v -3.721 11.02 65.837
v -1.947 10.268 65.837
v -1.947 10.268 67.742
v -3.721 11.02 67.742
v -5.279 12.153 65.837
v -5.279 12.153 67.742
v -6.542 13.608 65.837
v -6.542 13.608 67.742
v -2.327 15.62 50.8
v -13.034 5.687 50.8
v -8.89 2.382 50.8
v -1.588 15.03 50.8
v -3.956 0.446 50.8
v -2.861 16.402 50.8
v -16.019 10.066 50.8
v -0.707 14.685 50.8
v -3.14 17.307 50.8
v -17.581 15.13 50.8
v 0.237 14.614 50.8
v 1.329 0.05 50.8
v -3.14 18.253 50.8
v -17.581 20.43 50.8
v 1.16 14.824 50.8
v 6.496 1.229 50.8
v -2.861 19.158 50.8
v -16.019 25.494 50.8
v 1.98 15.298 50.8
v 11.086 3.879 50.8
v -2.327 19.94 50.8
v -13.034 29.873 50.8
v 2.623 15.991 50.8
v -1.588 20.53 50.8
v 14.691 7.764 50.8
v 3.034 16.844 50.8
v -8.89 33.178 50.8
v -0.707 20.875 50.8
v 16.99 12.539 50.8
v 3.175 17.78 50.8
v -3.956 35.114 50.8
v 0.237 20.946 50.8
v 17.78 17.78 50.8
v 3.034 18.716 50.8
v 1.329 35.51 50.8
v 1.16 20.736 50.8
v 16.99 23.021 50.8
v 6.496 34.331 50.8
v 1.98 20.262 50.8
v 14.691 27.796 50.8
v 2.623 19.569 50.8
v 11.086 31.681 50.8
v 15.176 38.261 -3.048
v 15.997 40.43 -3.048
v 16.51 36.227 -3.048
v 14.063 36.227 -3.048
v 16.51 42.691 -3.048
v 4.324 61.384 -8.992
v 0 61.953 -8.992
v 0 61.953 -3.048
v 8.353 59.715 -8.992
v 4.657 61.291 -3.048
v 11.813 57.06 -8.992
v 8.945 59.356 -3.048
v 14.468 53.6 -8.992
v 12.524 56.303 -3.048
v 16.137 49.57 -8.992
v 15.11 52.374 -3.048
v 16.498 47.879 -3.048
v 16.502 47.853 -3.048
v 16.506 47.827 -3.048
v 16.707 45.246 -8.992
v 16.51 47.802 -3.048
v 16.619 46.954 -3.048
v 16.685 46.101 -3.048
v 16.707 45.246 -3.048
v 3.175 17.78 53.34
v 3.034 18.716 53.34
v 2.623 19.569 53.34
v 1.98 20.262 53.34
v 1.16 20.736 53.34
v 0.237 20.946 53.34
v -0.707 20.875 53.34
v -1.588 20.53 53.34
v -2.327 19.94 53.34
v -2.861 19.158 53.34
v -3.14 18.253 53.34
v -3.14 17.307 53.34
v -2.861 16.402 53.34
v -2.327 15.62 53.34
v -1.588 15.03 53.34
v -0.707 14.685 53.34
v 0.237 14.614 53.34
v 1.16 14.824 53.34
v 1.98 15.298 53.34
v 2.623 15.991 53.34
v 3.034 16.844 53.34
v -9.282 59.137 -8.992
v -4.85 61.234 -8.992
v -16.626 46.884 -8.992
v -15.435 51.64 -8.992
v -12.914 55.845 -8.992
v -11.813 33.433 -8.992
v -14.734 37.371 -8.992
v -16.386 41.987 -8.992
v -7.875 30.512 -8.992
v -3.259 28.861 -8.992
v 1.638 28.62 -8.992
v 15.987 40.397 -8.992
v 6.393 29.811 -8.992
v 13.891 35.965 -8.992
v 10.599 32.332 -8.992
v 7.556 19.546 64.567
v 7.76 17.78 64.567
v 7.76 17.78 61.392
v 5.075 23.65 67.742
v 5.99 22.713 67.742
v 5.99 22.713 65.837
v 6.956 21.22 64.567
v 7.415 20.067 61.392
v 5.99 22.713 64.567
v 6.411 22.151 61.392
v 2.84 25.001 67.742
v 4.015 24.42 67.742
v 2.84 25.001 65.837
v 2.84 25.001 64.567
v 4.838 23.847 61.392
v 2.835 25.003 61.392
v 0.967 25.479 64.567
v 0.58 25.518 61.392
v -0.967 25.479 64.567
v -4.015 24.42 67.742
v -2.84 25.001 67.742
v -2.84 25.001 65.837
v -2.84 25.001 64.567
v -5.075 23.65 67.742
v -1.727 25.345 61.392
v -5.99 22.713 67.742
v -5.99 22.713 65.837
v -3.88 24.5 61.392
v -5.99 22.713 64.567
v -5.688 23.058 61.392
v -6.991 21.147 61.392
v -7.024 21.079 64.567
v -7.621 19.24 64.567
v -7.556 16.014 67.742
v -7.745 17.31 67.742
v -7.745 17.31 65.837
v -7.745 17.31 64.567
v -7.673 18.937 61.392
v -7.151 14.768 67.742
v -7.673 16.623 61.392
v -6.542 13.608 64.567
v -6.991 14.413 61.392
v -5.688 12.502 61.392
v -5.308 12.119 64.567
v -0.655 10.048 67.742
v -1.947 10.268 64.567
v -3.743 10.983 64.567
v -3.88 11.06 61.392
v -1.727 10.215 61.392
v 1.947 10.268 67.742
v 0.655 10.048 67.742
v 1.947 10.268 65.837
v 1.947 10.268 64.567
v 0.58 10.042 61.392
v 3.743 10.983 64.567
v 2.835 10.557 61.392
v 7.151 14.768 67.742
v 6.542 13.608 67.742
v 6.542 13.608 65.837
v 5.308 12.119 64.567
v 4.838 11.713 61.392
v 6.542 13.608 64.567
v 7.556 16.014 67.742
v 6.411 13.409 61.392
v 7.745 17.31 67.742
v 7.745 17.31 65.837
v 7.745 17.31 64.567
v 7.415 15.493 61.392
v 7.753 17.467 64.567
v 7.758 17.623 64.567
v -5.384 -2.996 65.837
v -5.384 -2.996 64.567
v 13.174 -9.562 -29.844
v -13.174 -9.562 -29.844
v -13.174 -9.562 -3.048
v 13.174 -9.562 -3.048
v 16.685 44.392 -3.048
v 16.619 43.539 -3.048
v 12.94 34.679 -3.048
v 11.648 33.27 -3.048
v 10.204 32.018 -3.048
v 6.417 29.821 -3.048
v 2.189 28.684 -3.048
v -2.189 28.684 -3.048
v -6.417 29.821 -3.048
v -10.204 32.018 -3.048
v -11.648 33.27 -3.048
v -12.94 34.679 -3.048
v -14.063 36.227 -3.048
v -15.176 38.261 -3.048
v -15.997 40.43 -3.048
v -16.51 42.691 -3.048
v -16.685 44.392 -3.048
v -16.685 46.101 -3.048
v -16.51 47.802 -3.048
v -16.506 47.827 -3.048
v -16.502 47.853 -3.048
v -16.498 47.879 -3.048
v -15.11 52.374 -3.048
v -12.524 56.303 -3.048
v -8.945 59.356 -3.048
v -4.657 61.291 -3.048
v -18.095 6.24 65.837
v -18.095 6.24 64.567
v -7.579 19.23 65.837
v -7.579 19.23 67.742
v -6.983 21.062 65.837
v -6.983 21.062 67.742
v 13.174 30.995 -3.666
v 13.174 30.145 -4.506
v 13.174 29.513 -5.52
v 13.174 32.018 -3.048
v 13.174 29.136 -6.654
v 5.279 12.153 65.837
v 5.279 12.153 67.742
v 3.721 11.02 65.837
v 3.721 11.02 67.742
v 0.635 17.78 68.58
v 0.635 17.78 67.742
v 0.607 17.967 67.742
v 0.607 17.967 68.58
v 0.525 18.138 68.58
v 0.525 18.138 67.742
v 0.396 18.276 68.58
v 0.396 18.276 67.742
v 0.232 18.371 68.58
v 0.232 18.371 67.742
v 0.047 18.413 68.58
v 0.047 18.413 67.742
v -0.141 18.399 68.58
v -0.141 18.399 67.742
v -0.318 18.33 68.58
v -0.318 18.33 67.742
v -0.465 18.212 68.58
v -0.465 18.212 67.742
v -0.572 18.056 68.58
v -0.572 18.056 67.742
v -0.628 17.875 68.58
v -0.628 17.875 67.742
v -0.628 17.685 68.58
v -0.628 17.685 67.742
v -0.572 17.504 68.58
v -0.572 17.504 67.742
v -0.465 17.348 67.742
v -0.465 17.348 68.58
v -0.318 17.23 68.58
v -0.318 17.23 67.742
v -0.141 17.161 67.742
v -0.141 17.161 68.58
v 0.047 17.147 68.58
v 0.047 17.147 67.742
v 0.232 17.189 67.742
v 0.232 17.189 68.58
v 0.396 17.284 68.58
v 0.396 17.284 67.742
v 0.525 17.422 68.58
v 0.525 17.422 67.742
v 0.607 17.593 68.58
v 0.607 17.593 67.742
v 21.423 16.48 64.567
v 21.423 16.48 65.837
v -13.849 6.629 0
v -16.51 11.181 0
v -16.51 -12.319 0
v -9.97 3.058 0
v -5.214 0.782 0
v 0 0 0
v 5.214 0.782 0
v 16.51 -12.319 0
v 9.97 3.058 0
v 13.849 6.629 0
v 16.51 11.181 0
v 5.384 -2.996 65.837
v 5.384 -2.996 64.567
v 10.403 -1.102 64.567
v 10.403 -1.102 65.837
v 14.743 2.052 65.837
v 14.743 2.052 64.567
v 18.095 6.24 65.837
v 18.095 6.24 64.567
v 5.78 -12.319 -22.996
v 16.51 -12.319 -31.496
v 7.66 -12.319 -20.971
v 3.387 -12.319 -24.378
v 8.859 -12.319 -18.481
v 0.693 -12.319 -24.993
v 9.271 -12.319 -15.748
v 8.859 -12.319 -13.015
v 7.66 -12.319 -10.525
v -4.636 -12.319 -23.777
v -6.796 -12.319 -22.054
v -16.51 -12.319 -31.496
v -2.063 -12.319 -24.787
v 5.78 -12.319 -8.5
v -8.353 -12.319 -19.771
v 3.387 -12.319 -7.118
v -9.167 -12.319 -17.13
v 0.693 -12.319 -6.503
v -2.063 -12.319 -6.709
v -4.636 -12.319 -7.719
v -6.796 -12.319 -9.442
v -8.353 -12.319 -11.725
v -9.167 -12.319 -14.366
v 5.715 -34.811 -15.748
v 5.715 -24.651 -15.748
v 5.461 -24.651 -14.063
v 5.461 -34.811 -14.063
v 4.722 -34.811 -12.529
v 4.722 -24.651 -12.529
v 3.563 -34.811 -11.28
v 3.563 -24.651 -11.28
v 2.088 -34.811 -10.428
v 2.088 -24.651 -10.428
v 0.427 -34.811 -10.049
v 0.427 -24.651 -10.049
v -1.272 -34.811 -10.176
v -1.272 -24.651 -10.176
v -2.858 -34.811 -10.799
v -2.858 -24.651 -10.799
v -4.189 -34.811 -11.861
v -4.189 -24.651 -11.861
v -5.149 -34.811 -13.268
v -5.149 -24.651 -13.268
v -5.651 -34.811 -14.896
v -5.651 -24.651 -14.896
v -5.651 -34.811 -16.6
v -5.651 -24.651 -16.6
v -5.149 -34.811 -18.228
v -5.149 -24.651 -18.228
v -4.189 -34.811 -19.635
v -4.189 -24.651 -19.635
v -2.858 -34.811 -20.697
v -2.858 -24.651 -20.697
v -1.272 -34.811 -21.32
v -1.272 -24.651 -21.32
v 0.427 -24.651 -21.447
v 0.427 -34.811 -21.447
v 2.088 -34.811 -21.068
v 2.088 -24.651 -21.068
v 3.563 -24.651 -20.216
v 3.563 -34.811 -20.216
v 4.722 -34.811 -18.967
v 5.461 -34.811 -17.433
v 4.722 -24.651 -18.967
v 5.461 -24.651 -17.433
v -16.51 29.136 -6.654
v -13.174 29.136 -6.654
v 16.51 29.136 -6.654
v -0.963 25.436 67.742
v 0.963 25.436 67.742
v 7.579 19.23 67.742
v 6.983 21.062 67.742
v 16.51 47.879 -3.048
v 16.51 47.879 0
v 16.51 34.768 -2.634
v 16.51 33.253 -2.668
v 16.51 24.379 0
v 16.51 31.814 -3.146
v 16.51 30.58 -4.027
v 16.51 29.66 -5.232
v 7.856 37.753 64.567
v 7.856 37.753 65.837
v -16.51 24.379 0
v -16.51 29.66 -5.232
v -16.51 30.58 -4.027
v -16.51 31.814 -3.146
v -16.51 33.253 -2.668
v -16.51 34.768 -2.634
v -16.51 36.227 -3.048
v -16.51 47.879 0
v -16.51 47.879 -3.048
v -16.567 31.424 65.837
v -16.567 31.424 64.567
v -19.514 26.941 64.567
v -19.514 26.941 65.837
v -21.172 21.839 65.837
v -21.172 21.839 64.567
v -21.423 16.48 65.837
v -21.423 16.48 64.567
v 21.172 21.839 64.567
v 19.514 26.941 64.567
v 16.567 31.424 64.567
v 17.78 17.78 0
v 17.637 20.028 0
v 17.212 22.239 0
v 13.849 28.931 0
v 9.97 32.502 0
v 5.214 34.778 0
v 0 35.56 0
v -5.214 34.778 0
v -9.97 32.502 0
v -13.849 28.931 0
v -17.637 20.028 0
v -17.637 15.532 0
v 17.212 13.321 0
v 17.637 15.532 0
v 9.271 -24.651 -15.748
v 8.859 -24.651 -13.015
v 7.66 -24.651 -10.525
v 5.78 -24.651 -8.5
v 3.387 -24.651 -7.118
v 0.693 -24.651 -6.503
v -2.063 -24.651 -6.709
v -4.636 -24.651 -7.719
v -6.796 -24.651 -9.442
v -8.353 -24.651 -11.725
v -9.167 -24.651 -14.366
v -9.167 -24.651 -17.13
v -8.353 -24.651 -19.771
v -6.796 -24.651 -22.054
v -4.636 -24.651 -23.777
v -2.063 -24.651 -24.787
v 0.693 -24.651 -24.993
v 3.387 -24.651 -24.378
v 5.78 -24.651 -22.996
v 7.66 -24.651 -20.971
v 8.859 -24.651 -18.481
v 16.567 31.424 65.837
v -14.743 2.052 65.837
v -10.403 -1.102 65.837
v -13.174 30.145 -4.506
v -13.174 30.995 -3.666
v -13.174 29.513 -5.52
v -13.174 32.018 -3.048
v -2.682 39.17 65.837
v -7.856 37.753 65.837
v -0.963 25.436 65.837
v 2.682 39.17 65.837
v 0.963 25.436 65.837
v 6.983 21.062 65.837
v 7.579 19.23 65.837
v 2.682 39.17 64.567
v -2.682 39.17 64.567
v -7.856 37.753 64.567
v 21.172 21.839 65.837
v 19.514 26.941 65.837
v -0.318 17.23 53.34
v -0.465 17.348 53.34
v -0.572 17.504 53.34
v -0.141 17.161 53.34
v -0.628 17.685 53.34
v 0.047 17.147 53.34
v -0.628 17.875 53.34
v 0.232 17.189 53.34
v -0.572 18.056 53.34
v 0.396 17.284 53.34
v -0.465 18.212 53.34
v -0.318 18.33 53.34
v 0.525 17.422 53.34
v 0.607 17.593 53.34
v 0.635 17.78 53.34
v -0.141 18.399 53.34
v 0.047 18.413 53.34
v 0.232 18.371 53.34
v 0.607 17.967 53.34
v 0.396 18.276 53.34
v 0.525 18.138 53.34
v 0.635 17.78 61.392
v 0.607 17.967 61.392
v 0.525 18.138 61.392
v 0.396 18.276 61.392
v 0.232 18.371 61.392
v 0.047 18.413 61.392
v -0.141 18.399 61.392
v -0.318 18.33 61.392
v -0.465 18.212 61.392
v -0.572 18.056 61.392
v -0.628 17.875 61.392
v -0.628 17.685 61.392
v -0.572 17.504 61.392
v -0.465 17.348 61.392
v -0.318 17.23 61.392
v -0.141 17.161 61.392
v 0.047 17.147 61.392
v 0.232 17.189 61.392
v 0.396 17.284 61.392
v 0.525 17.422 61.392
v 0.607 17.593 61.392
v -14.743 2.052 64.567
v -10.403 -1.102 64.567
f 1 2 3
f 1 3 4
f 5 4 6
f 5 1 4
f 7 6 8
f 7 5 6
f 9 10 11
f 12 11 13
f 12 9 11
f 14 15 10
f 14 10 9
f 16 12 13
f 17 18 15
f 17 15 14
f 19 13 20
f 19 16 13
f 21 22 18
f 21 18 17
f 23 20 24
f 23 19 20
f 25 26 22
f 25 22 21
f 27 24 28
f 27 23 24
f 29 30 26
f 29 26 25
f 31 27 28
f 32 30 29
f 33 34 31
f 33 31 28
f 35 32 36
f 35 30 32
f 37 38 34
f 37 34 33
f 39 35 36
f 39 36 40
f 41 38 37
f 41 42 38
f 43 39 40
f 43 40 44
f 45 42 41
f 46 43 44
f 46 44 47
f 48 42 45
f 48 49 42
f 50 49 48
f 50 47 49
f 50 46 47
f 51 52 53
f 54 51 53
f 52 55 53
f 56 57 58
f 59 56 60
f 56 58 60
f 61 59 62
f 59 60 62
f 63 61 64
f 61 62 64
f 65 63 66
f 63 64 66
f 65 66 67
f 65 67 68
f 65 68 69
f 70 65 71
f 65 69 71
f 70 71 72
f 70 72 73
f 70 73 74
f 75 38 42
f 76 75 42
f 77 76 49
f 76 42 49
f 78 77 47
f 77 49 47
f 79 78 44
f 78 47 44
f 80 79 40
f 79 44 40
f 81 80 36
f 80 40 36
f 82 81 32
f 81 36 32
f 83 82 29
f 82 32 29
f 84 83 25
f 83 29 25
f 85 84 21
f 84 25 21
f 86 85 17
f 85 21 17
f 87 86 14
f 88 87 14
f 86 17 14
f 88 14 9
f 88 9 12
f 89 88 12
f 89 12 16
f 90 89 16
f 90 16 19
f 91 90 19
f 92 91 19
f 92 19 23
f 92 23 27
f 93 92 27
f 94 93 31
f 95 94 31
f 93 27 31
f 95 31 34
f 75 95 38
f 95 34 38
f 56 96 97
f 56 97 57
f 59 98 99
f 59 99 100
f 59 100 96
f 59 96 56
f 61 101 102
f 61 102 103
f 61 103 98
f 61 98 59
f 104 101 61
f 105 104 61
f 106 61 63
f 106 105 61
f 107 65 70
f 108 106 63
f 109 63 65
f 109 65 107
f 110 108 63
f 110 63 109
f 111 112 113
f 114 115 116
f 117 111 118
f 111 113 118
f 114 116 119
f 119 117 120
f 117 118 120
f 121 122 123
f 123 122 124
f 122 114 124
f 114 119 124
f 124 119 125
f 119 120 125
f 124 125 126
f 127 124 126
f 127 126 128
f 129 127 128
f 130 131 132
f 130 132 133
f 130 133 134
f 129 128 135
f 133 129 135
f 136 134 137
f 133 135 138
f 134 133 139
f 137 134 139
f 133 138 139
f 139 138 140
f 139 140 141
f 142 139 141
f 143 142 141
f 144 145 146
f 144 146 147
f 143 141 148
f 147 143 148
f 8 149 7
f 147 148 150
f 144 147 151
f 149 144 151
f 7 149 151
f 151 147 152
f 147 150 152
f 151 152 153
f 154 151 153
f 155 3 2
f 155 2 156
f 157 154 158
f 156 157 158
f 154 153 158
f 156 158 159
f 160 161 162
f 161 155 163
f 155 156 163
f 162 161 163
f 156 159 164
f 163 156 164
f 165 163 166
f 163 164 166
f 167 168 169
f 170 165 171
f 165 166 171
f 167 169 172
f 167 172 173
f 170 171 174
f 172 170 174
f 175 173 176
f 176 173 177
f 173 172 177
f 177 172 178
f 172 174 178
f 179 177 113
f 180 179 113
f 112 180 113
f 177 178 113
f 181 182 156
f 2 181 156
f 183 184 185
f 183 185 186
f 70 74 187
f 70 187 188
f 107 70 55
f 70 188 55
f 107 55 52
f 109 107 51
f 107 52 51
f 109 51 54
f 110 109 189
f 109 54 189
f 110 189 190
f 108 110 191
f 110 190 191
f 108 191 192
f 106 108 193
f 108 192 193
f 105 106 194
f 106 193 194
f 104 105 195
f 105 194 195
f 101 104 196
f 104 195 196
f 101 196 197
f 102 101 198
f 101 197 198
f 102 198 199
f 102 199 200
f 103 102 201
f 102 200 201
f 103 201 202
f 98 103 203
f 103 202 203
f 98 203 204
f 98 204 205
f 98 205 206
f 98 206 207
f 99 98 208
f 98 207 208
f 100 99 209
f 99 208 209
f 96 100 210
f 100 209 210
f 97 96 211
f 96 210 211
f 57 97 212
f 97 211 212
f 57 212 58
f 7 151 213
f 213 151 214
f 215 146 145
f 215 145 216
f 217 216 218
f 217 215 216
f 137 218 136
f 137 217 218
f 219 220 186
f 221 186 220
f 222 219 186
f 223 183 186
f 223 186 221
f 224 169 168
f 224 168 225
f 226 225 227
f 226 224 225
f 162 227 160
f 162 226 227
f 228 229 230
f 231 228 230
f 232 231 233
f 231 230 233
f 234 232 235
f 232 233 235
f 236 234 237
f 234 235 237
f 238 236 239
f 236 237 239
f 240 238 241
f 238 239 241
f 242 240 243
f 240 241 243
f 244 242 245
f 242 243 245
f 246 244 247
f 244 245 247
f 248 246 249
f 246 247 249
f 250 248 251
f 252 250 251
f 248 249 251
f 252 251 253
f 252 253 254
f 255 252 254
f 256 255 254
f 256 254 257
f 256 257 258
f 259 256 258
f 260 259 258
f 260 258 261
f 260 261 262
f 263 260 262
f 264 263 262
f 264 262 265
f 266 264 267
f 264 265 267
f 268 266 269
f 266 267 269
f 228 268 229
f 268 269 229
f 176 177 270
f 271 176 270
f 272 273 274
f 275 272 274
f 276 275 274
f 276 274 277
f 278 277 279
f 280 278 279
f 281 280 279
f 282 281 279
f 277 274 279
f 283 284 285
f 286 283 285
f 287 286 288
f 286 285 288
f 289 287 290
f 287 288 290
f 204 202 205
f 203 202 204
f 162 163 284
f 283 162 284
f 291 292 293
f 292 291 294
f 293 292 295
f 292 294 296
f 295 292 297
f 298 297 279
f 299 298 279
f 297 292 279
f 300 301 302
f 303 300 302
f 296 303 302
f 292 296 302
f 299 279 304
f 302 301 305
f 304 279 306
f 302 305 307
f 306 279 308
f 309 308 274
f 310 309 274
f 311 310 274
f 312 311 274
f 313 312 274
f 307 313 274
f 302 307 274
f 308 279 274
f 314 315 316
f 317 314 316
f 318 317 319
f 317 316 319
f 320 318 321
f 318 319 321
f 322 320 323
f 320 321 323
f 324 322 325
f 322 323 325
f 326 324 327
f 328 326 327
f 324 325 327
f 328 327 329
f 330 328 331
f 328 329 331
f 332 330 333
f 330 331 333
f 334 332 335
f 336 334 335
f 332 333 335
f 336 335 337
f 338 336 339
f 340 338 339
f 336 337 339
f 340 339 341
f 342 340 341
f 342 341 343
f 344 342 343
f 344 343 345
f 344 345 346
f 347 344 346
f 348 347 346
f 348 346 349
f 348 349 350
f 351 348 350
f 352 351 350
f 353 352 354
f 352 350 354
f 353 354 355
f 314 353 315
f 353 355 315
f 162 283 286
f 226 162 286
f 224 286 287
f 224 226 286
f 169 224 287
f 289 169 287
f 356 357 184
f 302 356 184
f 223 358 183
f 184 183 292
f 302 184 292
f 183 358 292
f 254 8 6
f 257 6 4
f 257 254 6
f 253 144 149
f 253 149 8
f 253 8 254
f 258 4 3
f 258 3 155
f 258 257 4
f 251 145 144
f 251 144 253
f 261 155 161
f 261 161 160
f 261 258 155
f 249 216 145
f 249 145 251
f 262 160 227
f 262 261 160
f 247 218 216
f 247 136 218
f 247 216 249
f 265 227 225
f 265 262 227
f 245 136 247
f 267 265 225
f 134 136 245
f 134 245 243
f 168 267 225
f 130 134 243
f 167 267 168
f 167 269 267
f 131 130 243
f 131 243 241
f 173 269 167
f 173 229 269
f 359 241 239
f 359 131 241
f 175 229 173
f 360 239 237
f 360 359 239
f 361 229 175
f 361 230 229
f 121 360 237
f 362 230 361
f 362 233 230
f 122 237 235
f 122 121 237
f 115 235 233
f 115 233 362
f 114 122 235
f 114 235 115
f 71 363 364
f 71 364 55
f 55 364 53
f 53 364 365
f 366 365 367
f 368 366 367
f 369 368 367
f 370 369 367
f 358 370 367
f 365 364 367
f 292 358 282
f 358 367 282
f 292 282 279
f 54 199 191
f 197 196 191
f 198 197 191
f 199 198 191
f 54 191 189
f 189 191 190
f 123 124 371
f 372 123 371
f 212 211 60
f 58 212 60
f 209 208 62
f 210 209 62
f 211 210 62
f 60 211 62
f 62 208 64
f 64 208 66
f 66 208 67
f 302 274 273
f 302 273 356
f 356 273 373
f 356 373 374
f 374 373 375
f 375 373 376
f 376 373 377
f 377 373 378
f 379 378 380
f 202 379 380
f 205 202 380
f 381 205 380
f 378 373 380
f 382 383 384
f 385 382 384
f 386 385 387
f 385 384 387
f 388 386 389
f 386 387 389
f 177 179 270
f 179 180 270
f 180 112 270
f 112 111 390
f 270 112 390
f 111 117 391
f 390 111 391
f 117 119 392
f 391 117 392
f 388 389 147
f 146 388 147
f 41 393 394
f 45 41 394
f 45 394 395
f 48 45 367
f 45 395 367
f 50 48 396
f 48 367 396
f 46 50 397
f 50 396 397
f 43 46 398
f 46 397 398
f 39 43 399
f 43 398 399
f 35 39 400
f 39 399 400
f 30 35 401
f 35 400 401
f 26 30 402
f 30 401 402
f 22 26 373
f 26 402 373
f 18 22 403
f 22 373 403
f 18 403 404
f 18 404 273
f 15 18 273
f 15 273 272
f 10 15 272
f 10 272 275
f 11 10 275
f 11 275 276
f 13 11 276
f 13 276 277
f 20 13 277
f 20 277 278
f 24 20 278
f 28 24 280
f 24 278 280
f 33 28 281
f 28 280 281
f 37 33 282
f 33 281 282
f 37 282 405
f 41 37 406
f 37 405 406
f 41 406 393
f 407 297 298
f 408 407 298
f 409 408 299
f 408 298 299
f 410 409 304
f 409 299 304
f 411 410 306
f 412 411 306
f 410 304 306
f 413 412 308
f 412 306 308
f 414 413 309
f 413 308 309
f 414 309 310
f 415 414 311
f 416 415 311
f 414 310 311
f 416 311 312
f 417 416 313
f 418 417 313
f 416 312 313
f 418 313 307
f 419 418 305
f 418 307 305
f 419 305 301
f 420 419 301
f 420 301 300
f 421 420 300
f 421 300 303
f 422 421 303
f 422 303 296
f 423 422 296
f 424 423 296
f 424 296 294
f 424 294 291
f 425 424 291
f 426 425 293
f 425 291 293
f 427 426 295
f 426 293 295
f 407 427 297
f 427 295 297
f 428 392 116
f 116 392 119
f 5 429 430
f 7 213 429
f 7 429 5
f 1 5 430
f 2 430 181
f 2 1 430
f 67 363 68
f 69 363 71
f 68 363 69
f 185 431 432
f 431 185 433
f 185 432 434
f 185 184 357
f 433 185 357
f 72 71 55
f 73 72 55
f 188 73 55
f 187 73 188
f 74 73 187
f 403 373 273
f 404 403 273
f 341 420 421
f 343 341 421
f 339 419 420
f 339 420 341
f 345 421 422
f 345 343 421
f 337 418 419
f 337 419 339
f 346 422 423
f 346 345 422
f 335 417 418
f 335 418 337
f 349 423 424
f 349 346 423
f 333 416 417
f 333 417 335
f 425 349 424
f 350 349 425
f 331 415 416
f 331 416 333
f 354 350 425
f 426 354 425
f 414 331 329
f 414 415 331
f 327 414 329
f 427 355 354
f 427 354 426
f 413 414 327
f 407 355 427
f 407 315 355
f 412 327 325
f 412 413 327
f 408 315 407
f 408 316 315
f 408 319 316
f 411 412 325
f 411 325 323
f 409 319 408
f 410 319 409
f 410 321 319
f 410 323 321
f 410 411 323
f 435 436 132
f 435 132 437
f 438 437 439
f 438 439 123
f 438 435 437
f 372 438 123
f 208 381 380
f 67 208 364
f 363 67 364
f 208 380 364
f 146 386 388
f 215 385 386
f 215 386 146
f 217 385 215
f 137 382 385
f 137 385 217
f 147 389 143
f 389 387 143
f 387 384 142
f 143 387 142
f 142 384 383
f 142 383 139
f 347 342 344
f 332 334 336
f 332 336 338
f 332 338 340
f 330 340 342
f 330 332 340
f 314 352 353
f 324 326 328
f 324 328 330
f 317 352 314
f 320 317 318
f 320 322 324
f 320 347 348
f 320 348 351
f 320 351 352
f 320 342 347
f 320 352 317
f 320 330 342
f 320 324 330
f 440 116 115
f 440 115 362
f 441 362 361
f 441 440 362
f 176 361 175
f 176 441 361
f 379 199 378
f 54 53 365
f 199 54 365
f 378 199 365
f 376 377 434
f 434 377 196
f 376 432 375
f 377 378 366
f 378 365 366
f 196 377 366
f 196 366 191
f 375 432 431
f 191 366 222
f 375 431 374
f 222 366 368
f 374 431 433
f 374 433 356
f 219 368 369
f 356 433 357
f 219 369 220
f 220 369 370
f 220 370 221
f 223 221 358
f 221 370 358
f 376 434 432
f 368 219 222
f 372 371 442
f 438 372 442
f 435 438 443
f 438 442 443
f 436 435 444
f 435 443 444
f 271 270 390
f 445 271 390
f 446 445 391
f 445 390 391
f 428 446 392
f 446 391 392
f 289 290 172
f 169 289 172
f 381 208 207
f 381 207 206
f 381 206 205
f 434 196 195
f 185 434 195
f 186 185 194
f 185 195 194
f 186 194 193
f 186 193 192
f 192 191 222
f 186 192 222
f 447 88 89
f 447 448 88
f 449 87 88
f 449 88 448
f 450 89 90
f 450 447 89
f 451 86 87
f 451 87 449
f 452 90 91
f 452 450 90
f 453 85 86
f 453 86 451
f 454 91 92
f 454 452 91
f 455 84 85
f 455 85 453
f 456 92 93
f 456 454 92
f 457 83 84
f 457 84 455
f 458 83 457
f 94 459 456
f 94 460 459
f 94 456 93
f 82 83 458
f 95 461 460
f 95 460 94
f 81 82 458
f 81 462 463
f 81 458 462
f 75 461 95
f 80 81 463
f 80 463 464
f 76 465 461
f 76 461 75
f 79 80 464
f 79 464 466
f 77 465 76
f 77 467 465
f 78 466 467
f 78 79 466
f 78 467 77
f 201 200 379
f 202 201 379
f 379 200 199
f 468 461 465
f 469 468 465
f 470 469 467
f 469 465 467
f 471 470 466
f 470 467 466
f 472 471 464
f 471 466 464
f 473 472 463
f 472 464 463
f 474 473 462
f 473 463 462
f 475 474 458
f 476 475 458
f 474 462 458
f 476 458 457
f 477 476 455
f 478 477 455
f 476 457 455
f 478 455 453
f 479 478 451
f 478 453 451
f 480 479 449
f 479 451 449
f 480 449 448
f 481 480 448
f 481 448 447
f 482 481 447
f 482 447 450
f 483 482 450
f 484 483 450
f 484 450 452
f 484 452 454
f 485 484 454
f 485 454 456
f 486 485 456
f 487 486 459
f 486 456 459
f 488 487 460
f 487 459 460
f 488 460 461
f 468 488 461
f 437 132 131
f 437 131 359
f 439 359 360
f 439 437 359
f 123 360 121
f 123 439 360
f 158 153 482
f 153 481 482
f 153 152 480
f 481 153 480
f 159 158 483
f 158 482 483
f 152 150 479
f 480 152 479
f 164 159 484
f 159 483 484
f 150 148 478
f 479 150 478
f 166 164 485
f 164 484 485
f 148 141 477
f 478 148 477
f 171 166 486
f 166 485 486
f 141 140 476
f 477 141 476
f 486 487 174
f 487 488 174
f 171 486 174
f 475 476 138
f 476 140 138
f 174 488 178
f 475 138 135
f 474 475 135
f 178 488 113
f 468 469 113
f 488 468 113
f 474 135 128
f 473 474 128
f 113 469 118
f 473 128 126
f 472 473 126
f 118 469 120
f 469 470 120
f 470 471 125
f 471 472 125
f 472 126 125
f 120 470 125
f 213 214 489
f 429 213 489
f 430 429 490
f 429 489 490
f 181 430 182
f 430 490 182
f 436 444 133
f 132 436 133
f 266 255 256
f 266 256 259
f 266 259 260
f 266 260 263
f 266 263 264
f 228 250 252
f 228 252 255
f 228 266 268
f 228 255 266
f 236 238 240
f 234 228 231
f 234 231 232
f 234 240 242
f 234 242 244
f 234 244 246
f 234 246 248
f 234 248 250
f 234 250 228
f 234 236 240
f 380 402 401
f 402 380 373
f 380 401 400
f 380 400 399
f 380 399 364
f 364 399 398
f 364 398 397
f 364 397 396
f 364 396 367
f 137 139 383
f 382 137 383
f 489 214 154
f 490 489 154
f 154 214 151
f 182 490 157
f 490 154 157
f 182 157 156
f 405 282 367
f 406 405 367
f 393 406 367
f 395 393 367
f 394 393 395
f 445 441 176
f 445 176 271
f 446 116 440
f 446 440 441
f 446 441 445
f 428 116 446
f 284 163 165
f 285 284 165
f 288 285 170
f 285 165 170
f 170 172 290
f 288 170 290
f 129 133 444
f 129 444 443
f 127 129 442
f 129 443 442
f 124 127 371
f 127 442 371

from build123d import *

# Parameters (mm, degrees)
F1_DEPTH  = 50.8
F2_R      = 3.175
F3_DEPTH  = 2.54
F4_R      = 0.635
F5_DEPTH  = 8.0518
F6_R      = 7.7597
F7_DEPTH  = 3.175
F9_DEPTH  = 1.27
F10_DEPTH = 3.175
F11_R     = 0.635
F12_DEPTH = 0.8382
F14_DEPTH = 31.496
F16_DEPTH = 51.816
F18_W     = 26.3473056257
F18_H     = 54.6325752512
F19_DEPTH = 28.448
F21_DEPTH = 5.9436
F22_R     = 9.271
F23_DEPTH = 12.3317
F26_R     = 5.715
F27_DEPTH = 10.16


# Not quite as in the source:
# - a length typed as a fraction of an inch, garbled in the dataset ("3 / 203.2 mm" for 3/8 in), is restored


with BuildPart() as f1:
    # F0 (on Top) → F1 (new body)
    with BuildSketch(Plane.XY):
        with BuildLine():
            Line((0, 35.56), (0, 0))
            ThreePointArc((0, 0), (12.5723585695, 5.2076414305), (17.78, 17.78))
            ThreePointArc((17.78, 17.78), (12.5723585695, 30.3523585695), (0, 35.56))
        make_face()
        with BuildLine():
            ThreePointArc((0, 35.56), (-17.78, 17.78), (0, 0))
            Line((0, 0), (0, 35.56))
        make_face()
    extrude(amount=F1_DEPTH)

    # F2 (on face) → F3 (join)
    with BuildSketch(Plane.XY.offset(50.8)):
        with Locations((0, 17.78)):
            Circle(F2_R)
    extrude(amount=F3_DEPTH)

    # F4 (on face) → F5 (join)
    with BuildSketch(Plane.XY.offset(53.34)):
        with Locations((0, 17.78)):
            Circle(F4_R)
    extrude(amount=F5_DEPTH)

    # F6 (on face) → F7 (join)
    with BuildSketch(Plane.XY.offset(61.3918)):
        with Locations((0, 17.78)):
            Circle(F6_R)
    extrude(amount=F7_DEPTH)

    # F8 (on face) → F9 (join)
    with BuildSketch(Plane.XY.offset(64.5668)):
        with BuildLine():
            Line((-7.8562656417, 37.7526283264), (-2.8404457135, 25.0011364922))
            ThreePointArc((-2.8404457135, 25.0011364922), (0, 25.4905939517), (2.8404457135, 25.0011364922))
            Line((2.8404457135, 25.0011364922), (7.8562656417, 37.7526283264))
            ThreePointArc((7.8562656417, 37.7526283264), (0, 39.3496460261), (-7.8562656417, 37.7526283264))
        make_face()
        with BuildLine():
            ThreePointArc((-7.745454913, 17.3100294897), (-7.3332106223, 20.1627045678), (-5.9899629188, 22.7128782998))
            Line((-5.9899629188, 22.7128782998), (-16.5673787218, 31.4236342075))
            ThreePointArc((-16.5673787218, 31.4236342075), (-20.5139524073, 24.4453871847), (-21.422817913, 16.4801289429))
            Line((-21.422817913, 16.4801289429), (-7.745454913, 17.3100294897))
        make_face()
        with BuildLine():
            ThreePointArc((-1.946508681, 10.2684057588), (-4.5321734112, 11.5419984564), (-6.5424463887, 13.6075499595))
            Line((-6.5424463887, 13.6075499595), (-18.0954687963, 6.2396013439))
            ThreePointArc((-18.0954687963, 6.2396013439), (-12.6783198313, 0.3297898022), (-5.3837639633, -2.9959928207))
            Line((-5.3837639633, -2.9959928207), (-1.946508681, 10.2684057588))
        make_face()
        with BuildLine():
            ThreePointArc((6.5424463887, 13.6075499595), (4.5321734112, 11.5419984564), (1.946508681, 10.2684057588))
            Line((1.946508681, 10.2684057588), (5.3837639633, -2.9959928207))
            ThreePointArc((5.3837639633, -2.9959928207), (12.6783198313, 0.3297898022), (18.0954687963, 6.2396013439))
            Line((18.0954687963, 6.2396013439), (6.5424463887, 13.6075499595))
        make_face()
        with BuildLine():
            ThreePointArc((5.9899629188, 22.7128782998), (7.3332106223, 20.1627045678), (7.745454913, 17.3100294897))
            Line((7.745454913, 17.3100294897), (21.422817913, 16.4801289429))
            ThreePointArc((21.422817913, 16.4801289429), (20.5139524073, 24.4453871847), (16.5673787218, 31.4236342075))
            Line((16.5673787218, 31.4236342075), (5.9899629188, 22.7128782998))
        make_face()
    extrude(amount=F9_DEPTH)

    # F10 (add): a face of the model
    f10_faces = [f1.faces().sort_by_distance(p)[0] for p in [
        (0, 17.78, 64.5668),
    ]]
    extrude(f10_faces, amount=F10_DEPTH)

    # F11 (on face) → F12 (join)
    with BuildSketch(Plane.XY.offset(67.7418)):
        with Locations((0, 17.78)):
            Circle(F11_R)
    extrude(amount=F12_DEPTH)

    # F13 (on face) → F14 (join)
    with BuildSketch(Plane(origin=(0, 0, 0), x_dir=(1, 0, 0), z_dir=(0, 0, -1))):
        with BuildLine():
            Line((-16.51, 12.319), (-16.51, -11.1808864232))
            ThreePointArc((-16.51, -11.1808864232), (0, 0), (16.51, -11.1808864232))
            Line((16.51, -11.1808864232), (16.51, 12.319))
            Line((16.51, 12.319), (-16.51, 12.319))
        make_face()
        with BuildLine():
            ThreePointArc((16.51, -24.3791135768), (0, -35.56), (-16.51, -24.3791135768))
            Line((-16.51, -24.3791135768), (-16.51, -47.879))
            Line((-16.51, -47.879), (16.51, -47.879))
            Line((16.51, -47.879), (16.51, -24.3791135768))
        make_face()
        with BuildLine():
            Line((-16.51, -11.1808864232), (-16.51, -17.78))
            Line((-16.51, -17.78), (-16.51, -24.3791135768))
            ThreePointArc((-16.51, -24.3791135768), (0, -35.56), (16.51, -24.3791135768))
            Line((16.51, -24.3791135768), (16.51, -17.78))
            Line((16.51, -17.78), (16.51, -11.1808864232))
            ThreePointArc((16.51, -11.1808864232), (0, 0), (-16.51, -11.1808864232))
        make_face()
    extrude(amount=F14_DEPTH)

    # F15 (on face) → F16 (cut)
    with BuildSketch(Plane.YZ.offset(16.51)):
        with BuildLine():
            Line((29.1356388479, -6.6541871056), (-12.319, -31.496))
            Line((-12.319, -31.496), (47.879, -31.496))
            Line((47.879, -31.496), (47.879, -3.048))
            Line((47.879, -3.048), (36.2268202007, -3.048))
            ThreePointArc((36.2268202007, -3.048), (31.8141050009, -3.1459858946), (29.1356388479, -6.6541871056))
        make_face()
    extrude(amount=-F16_DEPTH, mode=Mode.SUBTRACT)

    # F18 (on offset) → F19 (cut)
    with BuildSketch(Plane.XY.offset(-31.496)):
        with Locations((0, 17.7540327422)):
            Rectangle(F18_W, F18_H)
    extrude(amount=F19_DEPTH, mode=Mode.SUBTRACT)

    # F20 (on face) → F21 (join)
    with BuildSketch(Plane(origin=(0, 0, -3.048), x_dir=(1, 0, 0), z_dir=(0, 0, -1))):
        with BuildLine():
            ThreePointArc((0, -61.9528820528), (11.813335281, -57.0596383625), (16.7065789713, -45.2463030815))
            ThreePointArc((16.7065789713, -45.2463030815), (-11.813335281, -33.4329678005), (0, -61.9528820528))
        make_face()
    extrude(amount=F21_DEPTH)

    # F22 (on face) → F23 (join)
    with BuildSketch(Plane.XZ.offset(12.319)):
        with Locations((0, -15.748)):
            Circle(F22_R)
    extrude(amount=F23_DEPTH)

    # F26 (on face) → F27 (join)
    with BuildSketch(Plane.XZ.offset(24.6507)):
        with Locations((0, -15.748)):
            Circle(F26_R)
    extrude(amount=F27_DEPTH)


solid = f1.part
